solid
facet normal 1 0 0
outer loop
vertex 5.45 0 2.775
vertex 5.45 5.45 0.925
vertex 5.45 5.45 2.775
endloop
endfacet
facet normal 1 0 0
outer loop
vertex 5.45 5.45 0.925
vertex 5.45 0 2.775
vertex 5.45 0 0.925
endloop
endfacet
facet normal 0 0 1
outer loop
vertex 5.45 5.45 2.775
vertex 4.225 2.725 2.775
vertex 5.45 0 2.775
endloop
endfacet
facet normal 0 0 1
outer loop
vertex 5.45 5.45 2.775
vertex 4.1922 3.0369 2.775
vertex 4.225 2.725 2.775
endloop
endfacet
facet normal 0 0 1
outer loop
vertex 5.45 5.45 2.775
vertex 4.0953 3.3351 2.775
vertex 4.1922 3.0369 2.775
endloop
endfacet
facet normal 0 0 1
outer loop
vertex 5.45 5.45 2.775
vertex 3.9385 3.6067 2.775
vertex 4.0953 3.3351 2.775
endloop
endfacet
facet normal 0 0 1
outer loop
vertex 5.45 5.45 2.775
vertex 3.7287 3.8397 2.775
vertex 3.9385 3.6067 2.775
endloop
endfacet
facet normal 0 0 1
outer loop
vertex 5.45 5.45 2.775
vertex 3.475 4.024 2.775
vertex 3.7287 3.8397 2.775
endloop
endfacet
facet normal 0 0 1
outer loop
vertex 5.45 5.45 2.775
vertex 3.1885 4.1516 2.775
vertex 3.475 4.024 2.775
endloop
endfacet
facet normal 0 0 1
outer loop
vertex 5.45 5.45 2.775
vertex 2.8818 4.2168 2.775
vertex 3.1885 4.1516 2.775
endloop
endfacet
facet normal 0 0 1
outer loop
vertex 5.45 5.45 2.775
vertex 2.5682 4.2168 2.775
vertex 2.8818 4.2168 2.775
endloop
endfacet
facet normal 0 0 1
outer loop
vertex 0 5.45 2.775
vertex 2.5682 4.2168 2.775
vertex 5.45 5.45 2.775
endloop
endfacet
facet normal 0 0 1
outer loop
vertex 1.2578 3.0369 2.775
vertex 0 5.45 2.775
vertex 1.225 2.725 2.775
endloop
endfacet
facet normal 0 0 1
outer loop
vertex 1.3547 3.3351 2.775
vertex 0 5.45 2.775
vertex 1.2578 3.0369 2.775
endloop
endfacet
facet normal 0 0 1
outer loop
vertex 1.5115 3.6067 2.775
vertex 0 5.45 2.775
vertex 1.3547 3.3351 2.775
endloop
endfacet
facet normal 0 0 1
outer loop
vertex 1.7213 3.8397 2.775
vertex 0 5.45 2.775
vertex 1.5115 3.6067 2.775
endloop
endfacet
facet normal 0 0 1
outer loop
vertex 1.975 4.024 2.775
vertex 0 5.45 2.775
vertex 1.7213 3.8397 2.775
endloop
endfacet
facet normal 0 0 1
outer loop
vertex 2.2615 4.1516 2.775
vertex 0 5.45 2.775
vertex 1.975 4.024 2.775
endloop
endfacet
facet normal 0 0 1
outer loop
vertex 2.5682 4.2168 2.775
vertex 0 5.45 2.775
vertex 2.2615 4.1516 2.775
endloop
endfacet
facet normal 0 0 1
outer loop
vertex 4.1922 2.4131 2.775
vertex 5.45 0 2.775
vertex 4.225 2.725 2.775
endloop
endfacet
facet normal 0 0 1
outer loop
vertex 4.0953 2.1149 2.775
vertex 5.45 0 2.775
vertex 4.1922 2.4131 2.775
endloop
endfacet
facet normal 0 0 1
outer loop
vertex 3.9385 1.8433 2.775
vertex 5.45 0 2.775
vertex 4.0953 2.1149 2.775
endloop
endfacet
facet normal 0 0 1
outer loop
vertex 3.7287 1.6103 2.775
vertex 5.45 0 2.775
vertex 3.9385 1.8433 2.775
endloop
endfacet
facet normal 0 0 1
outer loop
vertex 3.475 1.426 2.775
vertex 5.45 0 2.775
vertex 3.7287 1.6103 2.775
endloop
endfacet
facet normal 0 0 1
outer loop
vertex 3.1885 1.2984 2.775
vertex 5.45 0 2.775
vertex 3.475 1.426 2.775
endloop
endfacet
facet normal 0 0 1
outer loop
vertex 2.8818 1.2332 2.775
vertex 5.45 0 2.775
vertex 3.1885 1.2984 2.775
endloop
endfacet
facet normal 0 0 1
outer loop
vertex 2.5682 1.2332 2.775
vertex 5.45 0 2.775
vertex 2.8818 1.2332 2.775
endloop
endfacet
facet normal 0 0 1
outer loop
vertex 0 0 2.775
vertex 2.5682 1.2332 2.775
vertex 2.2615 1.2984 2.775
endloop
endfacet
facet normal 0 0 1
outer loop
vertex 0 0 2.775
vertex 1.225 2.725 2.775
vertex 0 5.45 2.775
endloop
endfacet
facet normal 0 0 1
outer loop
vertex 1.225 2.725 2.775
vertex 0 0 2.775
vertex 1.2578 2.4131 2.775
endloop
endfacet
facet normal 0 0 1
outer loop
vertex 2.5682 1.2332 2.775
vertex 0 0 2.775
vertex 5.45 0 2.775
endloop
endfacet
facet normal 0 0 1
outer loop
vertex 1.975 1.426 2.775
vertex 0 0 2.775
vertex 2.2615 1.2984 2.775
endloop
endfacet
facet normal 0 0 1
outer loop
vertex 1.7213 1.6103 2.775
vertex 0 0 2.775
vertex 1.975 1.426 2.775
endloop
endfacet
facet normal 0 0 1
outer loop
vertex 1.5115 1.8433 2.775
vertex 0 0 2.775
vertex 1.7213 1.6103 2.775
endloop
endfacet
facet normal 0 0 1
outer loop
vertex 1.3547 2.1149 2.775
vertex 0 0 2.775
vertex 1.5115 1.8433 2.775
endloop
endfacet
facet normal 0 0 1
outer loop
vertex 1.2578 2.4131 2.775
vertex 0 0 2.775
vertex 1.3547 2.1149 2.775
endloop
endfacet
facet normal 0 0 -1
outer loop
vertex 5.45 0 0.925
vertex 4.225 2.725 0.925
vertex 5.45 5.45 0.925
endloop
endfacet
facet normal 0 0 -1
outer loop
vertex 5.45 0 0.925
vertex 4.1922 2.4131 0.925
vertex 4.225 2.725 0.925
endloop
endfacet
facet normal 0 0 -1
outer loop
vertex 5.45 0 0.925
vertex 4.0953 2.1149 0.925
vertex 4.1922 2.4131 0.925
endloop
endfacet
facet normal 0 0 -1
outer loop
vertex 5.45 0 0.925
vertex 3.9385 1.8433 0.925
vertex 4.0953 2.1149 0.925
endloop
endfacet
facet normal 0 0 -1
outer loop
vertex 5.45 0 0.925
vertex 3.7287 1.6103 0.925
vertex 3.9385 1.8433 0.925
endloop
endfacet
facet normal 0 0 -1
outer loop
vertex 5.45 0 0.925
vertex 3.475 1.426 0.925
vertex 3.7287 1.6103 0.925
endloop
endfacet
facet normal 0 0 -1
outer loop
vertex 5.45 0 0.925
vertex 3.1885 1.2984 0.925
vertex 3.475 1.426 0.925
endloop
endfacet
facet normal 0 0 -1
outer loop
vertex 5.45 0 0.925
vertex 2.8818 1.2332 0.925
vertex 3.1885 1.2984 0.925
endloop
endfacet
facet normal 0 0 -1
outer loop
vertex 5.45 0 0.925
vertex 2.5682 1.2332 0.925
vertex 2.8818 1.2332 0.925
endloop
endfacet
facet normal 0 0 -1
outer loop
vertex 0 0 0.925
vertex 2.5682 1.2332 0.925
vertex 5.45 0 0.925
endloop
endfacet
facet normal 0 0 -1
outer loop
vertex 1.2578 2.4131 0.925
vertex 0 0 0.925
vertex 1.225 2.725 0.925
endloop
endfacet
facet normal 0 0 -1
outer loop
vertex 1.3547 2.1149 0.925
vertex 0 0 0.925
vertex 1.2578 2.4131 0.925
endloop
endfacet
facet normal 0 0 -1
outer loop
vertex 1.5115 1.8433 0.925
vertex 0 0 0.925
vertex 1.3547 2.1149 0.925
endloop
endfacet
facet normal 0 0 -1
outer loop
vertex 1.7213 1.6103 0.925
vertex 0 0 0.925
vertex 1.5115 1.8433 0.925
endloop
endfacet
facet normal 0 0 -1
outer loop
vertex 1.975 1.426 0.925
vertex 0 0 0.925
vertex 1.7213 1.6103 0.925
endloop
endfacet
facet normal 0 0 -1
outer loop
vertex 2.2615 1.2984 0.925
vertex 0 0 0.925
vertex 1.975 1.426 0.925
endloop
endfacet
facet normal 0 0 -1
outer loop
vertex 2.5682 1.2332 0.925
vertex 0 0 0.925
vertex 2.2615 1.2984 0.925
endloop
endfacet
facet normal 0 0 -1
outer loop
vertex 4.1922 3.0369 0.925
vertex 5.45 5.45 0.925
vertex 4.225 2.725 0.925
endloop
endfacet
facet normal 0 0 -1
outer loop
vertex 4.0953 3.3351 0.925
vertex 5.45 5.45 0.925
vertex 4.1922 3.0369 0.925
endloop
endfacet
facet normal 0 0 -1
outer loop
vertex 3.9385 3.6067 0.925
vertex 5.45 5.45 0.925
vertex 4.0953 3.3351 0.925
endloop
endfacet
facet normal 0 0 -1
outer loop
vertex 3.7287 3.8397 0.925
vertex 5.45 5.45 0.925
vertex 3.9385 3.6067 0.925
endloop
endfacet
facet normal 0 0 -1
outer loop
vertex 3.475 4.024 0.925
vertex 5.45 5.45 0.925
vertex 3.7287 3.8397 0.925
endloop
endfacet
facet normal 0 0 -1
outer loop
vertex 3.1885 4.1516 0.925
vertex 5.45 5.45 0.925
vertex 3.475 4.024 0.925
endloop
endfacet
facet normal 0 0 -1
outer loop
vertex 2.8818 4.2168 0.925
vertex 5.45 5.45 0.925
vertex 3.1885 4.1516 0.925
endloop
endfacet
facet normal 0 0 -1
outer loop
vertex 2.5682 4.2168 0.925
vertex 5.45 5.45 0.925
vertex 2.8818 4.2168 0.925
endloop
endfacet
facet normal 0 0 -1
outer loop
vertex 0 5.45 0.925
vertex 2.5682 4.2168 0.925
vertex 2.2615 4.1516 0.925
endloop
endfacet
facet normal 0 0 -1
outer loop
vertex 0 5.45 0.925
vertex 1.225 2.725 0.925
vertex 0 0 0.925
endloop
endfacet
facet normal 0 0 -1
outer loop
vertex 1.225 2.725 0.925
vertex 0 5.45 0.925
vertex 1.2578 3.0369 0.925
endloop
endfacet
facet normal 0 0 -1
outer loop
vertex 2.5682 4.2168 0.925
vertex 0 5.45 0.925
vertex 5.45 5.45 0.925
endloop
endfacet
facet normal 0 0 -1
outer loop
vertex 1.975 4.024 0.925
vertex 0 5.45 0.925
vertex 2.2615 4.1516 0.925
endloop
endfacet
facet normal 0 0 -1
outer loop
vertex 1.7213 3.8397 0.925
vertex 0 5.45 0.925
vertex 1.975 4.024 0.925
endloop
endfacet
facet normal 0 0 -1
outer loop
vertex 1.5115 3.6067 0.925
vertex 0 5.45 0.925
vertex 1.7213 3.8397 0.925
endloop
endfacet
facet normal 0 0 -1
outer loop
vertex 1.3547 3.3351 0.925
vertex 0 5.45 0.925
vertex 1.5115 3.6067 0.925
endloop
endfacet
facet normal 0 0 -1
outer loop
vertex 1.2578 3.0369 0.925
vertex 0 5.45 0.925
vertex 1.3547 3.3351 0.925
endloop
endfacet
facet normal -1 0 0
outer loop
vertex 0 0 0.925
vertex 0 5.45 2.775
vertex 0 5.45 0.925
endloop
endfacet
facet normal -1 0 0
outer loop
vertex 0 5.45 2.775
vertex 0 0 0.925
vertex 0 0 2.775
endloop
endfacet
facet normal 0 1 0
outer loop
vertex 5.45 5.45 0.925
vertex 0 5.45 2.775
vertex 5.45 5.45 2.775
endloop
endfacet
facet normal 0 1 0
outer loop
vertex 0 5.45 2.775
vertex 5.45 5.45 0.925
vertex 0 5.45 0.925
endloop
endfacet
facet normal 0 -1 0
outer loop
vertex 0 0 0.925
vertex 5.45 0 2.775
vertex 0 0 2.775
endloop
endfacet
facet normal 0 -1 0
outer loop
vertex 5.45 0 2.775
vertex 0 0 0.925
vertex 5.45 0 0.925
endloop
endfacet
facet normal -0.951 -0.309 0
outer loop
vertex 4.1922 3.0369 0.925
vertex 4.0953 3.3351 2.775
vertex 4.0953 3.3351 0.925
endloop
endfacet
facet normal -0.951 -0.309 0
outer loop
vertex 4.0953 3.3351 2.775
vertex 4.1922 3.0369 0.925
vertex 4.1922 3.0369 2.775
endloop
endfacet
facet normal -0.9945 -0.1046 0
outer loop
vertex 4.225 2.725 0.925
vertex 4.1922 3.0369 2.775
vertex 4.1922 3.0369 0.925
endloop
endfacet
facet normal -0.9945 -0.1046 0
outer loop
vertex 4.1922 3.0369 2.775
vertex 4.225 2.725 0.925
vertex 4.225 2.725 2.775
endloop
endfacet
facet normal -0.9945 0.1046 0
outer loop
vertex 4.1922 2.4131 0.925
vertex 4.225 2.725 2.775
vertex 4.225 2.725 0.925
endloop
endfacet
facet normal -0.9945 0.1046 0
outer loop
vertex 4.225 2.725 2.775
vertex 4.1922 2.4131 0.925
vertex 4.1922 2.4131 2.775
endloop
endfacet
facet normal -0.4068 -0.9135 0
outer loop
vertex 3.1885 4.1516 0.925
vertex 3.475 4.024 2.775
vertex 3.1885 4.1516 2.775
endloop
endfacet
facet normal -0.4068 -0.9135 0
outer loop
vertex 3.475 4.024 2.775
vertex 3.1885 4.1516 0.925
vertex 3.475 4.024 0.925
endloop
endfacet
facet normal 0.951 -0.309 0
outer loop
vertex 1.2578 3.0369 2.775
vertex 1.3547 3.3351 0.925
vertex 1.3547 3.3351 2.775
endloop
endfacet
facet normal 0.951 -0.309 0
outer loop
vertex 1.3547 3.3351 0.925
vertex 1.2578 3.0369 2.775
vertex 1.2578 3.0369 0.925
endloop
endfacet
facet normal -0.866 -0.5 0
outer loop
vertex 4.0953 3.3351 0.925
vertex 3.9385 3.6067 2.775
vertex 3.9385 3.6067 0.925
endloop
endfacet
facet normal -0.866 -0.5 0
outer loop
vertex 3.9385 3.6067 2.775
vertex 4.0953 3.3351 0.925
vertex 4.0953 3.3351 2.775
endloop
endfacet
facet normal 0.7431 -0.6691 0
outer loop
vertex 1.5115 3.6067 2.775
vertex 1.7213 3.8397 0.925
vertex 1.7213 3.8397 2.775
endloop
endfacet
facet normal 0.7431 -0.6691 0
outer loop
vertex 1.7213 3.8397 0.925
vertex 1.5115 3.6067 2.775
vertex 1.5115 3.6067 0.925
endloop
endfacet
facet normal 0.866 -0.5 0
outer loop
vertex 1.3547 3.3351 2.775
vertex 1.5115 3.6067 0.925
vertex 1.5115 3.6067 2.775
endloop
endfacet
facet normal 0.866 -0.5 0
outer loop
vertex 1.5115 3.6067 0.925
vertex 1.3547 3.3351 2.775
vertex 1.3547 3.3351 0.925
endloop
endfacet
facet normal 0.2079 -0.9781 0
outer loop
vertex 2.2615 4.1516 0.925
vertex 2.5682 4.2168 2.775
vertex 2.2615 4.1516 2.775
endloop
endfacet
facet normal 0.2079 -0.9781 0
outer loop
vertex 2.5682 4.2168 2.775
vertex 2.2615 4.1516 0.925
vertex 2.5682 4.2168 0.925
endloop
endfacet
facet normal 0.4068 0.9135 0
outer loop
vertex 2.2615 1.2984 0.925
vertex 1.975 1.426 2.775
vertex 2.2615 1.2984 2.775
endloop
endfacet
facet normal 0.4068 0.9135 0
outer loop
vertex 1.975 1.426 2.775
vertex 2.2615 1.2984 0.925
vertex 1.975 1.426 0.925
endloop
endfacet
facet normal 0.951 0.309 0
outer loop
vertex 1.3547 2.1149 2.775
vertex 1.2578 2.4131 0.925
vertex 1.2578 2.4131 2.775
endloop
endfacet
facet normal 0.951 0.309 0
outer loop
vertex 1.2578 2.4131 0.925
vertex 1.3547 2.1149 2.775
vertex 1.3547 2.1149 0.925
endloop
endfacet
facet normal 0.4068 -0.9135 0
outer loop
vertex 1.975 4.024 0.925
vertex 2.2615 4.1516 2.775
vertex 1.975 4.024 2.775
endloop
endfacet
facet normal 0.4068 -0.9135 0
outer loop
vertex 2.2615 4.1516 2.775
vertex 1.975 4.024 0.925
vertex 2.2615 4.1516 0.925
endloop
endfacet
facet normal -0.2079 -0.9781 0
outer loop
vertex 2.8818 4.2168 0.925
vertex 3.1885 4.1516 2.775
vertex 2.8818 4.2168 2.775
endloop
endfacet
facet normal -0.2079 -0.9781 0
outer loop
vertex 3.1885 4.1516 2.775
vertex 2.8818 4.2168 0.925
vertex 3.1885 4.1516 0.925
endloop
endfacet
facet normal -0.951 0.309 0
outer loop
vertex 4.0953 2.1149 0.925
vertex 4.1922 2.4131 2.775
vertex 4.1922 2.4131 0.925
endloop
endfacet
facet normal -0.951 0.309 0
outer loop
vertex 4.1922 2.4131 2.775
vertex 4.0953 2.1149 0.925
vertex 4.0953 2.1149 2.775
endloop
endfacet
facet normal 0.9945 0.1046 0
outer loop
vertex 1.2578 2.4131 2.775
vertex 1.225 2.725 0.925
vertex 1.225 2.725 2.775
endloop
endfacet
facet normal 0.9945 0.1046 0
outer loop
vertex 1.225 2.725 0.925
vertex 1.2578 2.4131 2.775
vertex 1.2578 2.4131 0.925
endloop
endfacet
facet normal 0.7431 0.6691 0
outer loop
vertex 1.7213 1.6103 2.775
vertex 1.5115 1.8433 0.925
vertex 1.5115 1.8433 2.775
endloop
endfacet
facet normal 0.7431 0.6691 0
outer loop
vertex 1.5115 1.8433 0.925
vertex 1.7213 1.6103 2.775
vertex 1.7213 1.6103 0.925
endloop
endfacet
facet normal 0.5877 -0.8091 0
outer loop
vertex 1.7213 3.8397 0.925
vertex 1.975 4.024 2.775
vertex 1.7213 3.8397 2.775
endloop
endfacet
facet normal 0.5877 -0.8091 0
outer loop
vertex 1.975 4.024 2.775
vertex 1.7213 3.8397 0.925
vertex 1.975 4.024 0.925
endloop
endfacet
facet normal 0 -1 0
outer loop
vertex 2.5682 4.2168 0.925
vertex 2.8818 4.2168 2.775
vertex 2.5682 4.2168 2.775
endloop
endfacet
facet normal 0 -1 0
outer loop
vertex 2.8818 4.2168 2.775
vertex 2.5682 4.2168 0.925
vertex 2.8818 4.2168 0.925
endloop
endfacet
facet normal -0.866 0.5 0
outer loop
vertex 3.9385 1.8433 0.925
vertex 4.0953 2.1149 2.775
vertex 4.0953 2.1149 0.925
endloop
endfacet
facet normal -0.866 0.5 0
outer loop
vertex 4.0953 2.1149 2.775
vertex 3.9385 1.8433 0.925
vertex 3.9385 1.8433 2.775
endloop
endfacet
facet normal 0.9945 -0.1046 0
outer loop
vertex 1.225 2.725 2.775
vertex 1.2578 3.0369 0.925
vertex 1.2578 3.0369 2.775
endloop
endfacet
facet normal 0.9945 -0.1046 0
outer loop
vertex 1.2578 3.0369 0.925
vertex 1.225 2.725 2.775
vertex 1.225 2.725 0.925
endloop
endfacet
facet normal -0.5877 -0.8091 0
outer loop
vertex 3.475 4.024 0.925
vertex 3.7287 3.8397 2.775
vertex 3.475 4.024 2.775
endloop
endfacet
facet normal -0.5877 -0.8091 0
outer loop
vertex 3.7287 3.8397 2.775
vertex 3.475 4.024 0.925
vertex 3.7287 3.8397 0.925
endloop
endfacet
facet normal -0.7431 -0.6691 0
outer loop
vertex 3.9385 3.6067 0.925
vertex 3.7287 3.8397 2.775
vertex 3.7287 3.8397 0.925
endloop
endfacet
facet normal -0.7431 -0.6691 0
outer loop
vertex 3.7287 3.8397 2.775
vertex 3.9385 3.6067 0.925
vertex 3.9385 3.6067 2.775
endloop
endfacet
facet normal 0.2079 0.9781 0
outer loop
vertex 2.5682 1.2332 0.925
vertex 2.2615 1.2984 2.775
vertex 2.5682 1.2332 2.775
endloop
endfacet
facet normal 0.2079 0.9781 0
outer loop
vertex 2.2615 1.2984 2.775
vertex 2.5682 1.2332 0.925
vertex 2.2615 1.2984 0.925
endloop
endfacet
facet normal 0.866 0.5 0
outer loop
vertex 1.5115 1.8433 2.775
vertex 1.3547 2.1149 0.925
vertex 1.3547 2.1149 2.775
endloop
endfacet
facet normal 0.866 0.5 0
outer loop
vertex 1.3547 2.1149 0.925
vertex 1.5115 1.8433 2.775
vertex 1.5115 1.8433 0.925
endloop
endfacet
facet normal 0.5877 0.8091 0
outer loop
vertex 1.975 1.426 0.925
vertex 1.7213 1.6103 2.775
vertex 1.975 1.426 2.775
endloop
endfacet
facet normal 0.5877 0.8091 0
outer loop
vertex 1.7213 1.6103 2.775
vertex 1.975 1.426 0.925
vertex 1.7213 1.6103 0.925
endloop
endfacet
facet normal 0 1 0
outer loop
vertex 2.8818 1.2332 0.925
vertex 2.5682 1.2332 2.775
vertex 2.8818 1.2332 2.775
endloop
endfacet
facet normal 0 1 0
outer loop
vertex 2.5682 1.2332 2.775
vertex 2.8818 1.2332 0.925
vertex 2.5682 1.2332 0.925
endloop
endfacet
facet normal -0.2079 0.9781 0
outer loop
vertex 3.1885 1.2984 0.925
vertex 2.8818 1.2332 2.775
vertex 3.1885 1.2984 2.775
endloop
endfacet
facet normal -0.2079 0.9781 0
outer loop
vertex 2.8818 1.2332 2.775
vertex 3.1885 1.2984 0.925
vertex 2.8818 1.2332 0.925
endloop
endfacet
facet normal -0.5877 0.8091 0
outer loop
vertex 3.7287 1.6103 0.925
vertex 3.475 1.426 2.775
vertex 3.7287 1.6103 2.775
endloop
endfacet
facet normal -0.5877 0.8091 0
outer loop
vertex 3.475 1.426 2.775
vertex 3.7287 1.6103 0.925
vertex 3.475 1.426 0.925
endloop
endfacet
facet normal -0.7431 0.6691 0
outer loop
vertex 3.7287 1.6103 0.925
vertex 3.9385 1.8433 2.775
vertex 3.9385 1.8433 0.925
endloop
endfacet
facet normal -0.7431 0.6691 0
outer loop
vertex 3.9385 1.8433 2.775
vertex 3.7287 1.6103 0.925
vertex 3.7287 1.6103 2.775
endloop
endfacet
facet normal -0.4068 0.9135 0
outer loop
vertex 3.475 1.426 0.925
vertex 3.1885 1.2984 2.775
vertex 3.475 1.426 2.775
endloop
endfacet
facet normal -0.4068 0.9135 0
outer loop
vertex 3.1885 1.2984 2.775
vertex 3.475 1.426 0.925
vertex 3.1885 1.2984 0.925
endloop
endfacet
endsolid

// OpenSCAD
module m3_square_nut() {
    color("Silver") {
        translate([0,0,1.85/2]) {
            difference() {
                cube([5.45,5.45,1.85]);
                translate([5.45/2,5.45/2,-5])cylinder(d=3, h=10, $fn=30);
            }
        }
    }
}

m3_square_nut();
